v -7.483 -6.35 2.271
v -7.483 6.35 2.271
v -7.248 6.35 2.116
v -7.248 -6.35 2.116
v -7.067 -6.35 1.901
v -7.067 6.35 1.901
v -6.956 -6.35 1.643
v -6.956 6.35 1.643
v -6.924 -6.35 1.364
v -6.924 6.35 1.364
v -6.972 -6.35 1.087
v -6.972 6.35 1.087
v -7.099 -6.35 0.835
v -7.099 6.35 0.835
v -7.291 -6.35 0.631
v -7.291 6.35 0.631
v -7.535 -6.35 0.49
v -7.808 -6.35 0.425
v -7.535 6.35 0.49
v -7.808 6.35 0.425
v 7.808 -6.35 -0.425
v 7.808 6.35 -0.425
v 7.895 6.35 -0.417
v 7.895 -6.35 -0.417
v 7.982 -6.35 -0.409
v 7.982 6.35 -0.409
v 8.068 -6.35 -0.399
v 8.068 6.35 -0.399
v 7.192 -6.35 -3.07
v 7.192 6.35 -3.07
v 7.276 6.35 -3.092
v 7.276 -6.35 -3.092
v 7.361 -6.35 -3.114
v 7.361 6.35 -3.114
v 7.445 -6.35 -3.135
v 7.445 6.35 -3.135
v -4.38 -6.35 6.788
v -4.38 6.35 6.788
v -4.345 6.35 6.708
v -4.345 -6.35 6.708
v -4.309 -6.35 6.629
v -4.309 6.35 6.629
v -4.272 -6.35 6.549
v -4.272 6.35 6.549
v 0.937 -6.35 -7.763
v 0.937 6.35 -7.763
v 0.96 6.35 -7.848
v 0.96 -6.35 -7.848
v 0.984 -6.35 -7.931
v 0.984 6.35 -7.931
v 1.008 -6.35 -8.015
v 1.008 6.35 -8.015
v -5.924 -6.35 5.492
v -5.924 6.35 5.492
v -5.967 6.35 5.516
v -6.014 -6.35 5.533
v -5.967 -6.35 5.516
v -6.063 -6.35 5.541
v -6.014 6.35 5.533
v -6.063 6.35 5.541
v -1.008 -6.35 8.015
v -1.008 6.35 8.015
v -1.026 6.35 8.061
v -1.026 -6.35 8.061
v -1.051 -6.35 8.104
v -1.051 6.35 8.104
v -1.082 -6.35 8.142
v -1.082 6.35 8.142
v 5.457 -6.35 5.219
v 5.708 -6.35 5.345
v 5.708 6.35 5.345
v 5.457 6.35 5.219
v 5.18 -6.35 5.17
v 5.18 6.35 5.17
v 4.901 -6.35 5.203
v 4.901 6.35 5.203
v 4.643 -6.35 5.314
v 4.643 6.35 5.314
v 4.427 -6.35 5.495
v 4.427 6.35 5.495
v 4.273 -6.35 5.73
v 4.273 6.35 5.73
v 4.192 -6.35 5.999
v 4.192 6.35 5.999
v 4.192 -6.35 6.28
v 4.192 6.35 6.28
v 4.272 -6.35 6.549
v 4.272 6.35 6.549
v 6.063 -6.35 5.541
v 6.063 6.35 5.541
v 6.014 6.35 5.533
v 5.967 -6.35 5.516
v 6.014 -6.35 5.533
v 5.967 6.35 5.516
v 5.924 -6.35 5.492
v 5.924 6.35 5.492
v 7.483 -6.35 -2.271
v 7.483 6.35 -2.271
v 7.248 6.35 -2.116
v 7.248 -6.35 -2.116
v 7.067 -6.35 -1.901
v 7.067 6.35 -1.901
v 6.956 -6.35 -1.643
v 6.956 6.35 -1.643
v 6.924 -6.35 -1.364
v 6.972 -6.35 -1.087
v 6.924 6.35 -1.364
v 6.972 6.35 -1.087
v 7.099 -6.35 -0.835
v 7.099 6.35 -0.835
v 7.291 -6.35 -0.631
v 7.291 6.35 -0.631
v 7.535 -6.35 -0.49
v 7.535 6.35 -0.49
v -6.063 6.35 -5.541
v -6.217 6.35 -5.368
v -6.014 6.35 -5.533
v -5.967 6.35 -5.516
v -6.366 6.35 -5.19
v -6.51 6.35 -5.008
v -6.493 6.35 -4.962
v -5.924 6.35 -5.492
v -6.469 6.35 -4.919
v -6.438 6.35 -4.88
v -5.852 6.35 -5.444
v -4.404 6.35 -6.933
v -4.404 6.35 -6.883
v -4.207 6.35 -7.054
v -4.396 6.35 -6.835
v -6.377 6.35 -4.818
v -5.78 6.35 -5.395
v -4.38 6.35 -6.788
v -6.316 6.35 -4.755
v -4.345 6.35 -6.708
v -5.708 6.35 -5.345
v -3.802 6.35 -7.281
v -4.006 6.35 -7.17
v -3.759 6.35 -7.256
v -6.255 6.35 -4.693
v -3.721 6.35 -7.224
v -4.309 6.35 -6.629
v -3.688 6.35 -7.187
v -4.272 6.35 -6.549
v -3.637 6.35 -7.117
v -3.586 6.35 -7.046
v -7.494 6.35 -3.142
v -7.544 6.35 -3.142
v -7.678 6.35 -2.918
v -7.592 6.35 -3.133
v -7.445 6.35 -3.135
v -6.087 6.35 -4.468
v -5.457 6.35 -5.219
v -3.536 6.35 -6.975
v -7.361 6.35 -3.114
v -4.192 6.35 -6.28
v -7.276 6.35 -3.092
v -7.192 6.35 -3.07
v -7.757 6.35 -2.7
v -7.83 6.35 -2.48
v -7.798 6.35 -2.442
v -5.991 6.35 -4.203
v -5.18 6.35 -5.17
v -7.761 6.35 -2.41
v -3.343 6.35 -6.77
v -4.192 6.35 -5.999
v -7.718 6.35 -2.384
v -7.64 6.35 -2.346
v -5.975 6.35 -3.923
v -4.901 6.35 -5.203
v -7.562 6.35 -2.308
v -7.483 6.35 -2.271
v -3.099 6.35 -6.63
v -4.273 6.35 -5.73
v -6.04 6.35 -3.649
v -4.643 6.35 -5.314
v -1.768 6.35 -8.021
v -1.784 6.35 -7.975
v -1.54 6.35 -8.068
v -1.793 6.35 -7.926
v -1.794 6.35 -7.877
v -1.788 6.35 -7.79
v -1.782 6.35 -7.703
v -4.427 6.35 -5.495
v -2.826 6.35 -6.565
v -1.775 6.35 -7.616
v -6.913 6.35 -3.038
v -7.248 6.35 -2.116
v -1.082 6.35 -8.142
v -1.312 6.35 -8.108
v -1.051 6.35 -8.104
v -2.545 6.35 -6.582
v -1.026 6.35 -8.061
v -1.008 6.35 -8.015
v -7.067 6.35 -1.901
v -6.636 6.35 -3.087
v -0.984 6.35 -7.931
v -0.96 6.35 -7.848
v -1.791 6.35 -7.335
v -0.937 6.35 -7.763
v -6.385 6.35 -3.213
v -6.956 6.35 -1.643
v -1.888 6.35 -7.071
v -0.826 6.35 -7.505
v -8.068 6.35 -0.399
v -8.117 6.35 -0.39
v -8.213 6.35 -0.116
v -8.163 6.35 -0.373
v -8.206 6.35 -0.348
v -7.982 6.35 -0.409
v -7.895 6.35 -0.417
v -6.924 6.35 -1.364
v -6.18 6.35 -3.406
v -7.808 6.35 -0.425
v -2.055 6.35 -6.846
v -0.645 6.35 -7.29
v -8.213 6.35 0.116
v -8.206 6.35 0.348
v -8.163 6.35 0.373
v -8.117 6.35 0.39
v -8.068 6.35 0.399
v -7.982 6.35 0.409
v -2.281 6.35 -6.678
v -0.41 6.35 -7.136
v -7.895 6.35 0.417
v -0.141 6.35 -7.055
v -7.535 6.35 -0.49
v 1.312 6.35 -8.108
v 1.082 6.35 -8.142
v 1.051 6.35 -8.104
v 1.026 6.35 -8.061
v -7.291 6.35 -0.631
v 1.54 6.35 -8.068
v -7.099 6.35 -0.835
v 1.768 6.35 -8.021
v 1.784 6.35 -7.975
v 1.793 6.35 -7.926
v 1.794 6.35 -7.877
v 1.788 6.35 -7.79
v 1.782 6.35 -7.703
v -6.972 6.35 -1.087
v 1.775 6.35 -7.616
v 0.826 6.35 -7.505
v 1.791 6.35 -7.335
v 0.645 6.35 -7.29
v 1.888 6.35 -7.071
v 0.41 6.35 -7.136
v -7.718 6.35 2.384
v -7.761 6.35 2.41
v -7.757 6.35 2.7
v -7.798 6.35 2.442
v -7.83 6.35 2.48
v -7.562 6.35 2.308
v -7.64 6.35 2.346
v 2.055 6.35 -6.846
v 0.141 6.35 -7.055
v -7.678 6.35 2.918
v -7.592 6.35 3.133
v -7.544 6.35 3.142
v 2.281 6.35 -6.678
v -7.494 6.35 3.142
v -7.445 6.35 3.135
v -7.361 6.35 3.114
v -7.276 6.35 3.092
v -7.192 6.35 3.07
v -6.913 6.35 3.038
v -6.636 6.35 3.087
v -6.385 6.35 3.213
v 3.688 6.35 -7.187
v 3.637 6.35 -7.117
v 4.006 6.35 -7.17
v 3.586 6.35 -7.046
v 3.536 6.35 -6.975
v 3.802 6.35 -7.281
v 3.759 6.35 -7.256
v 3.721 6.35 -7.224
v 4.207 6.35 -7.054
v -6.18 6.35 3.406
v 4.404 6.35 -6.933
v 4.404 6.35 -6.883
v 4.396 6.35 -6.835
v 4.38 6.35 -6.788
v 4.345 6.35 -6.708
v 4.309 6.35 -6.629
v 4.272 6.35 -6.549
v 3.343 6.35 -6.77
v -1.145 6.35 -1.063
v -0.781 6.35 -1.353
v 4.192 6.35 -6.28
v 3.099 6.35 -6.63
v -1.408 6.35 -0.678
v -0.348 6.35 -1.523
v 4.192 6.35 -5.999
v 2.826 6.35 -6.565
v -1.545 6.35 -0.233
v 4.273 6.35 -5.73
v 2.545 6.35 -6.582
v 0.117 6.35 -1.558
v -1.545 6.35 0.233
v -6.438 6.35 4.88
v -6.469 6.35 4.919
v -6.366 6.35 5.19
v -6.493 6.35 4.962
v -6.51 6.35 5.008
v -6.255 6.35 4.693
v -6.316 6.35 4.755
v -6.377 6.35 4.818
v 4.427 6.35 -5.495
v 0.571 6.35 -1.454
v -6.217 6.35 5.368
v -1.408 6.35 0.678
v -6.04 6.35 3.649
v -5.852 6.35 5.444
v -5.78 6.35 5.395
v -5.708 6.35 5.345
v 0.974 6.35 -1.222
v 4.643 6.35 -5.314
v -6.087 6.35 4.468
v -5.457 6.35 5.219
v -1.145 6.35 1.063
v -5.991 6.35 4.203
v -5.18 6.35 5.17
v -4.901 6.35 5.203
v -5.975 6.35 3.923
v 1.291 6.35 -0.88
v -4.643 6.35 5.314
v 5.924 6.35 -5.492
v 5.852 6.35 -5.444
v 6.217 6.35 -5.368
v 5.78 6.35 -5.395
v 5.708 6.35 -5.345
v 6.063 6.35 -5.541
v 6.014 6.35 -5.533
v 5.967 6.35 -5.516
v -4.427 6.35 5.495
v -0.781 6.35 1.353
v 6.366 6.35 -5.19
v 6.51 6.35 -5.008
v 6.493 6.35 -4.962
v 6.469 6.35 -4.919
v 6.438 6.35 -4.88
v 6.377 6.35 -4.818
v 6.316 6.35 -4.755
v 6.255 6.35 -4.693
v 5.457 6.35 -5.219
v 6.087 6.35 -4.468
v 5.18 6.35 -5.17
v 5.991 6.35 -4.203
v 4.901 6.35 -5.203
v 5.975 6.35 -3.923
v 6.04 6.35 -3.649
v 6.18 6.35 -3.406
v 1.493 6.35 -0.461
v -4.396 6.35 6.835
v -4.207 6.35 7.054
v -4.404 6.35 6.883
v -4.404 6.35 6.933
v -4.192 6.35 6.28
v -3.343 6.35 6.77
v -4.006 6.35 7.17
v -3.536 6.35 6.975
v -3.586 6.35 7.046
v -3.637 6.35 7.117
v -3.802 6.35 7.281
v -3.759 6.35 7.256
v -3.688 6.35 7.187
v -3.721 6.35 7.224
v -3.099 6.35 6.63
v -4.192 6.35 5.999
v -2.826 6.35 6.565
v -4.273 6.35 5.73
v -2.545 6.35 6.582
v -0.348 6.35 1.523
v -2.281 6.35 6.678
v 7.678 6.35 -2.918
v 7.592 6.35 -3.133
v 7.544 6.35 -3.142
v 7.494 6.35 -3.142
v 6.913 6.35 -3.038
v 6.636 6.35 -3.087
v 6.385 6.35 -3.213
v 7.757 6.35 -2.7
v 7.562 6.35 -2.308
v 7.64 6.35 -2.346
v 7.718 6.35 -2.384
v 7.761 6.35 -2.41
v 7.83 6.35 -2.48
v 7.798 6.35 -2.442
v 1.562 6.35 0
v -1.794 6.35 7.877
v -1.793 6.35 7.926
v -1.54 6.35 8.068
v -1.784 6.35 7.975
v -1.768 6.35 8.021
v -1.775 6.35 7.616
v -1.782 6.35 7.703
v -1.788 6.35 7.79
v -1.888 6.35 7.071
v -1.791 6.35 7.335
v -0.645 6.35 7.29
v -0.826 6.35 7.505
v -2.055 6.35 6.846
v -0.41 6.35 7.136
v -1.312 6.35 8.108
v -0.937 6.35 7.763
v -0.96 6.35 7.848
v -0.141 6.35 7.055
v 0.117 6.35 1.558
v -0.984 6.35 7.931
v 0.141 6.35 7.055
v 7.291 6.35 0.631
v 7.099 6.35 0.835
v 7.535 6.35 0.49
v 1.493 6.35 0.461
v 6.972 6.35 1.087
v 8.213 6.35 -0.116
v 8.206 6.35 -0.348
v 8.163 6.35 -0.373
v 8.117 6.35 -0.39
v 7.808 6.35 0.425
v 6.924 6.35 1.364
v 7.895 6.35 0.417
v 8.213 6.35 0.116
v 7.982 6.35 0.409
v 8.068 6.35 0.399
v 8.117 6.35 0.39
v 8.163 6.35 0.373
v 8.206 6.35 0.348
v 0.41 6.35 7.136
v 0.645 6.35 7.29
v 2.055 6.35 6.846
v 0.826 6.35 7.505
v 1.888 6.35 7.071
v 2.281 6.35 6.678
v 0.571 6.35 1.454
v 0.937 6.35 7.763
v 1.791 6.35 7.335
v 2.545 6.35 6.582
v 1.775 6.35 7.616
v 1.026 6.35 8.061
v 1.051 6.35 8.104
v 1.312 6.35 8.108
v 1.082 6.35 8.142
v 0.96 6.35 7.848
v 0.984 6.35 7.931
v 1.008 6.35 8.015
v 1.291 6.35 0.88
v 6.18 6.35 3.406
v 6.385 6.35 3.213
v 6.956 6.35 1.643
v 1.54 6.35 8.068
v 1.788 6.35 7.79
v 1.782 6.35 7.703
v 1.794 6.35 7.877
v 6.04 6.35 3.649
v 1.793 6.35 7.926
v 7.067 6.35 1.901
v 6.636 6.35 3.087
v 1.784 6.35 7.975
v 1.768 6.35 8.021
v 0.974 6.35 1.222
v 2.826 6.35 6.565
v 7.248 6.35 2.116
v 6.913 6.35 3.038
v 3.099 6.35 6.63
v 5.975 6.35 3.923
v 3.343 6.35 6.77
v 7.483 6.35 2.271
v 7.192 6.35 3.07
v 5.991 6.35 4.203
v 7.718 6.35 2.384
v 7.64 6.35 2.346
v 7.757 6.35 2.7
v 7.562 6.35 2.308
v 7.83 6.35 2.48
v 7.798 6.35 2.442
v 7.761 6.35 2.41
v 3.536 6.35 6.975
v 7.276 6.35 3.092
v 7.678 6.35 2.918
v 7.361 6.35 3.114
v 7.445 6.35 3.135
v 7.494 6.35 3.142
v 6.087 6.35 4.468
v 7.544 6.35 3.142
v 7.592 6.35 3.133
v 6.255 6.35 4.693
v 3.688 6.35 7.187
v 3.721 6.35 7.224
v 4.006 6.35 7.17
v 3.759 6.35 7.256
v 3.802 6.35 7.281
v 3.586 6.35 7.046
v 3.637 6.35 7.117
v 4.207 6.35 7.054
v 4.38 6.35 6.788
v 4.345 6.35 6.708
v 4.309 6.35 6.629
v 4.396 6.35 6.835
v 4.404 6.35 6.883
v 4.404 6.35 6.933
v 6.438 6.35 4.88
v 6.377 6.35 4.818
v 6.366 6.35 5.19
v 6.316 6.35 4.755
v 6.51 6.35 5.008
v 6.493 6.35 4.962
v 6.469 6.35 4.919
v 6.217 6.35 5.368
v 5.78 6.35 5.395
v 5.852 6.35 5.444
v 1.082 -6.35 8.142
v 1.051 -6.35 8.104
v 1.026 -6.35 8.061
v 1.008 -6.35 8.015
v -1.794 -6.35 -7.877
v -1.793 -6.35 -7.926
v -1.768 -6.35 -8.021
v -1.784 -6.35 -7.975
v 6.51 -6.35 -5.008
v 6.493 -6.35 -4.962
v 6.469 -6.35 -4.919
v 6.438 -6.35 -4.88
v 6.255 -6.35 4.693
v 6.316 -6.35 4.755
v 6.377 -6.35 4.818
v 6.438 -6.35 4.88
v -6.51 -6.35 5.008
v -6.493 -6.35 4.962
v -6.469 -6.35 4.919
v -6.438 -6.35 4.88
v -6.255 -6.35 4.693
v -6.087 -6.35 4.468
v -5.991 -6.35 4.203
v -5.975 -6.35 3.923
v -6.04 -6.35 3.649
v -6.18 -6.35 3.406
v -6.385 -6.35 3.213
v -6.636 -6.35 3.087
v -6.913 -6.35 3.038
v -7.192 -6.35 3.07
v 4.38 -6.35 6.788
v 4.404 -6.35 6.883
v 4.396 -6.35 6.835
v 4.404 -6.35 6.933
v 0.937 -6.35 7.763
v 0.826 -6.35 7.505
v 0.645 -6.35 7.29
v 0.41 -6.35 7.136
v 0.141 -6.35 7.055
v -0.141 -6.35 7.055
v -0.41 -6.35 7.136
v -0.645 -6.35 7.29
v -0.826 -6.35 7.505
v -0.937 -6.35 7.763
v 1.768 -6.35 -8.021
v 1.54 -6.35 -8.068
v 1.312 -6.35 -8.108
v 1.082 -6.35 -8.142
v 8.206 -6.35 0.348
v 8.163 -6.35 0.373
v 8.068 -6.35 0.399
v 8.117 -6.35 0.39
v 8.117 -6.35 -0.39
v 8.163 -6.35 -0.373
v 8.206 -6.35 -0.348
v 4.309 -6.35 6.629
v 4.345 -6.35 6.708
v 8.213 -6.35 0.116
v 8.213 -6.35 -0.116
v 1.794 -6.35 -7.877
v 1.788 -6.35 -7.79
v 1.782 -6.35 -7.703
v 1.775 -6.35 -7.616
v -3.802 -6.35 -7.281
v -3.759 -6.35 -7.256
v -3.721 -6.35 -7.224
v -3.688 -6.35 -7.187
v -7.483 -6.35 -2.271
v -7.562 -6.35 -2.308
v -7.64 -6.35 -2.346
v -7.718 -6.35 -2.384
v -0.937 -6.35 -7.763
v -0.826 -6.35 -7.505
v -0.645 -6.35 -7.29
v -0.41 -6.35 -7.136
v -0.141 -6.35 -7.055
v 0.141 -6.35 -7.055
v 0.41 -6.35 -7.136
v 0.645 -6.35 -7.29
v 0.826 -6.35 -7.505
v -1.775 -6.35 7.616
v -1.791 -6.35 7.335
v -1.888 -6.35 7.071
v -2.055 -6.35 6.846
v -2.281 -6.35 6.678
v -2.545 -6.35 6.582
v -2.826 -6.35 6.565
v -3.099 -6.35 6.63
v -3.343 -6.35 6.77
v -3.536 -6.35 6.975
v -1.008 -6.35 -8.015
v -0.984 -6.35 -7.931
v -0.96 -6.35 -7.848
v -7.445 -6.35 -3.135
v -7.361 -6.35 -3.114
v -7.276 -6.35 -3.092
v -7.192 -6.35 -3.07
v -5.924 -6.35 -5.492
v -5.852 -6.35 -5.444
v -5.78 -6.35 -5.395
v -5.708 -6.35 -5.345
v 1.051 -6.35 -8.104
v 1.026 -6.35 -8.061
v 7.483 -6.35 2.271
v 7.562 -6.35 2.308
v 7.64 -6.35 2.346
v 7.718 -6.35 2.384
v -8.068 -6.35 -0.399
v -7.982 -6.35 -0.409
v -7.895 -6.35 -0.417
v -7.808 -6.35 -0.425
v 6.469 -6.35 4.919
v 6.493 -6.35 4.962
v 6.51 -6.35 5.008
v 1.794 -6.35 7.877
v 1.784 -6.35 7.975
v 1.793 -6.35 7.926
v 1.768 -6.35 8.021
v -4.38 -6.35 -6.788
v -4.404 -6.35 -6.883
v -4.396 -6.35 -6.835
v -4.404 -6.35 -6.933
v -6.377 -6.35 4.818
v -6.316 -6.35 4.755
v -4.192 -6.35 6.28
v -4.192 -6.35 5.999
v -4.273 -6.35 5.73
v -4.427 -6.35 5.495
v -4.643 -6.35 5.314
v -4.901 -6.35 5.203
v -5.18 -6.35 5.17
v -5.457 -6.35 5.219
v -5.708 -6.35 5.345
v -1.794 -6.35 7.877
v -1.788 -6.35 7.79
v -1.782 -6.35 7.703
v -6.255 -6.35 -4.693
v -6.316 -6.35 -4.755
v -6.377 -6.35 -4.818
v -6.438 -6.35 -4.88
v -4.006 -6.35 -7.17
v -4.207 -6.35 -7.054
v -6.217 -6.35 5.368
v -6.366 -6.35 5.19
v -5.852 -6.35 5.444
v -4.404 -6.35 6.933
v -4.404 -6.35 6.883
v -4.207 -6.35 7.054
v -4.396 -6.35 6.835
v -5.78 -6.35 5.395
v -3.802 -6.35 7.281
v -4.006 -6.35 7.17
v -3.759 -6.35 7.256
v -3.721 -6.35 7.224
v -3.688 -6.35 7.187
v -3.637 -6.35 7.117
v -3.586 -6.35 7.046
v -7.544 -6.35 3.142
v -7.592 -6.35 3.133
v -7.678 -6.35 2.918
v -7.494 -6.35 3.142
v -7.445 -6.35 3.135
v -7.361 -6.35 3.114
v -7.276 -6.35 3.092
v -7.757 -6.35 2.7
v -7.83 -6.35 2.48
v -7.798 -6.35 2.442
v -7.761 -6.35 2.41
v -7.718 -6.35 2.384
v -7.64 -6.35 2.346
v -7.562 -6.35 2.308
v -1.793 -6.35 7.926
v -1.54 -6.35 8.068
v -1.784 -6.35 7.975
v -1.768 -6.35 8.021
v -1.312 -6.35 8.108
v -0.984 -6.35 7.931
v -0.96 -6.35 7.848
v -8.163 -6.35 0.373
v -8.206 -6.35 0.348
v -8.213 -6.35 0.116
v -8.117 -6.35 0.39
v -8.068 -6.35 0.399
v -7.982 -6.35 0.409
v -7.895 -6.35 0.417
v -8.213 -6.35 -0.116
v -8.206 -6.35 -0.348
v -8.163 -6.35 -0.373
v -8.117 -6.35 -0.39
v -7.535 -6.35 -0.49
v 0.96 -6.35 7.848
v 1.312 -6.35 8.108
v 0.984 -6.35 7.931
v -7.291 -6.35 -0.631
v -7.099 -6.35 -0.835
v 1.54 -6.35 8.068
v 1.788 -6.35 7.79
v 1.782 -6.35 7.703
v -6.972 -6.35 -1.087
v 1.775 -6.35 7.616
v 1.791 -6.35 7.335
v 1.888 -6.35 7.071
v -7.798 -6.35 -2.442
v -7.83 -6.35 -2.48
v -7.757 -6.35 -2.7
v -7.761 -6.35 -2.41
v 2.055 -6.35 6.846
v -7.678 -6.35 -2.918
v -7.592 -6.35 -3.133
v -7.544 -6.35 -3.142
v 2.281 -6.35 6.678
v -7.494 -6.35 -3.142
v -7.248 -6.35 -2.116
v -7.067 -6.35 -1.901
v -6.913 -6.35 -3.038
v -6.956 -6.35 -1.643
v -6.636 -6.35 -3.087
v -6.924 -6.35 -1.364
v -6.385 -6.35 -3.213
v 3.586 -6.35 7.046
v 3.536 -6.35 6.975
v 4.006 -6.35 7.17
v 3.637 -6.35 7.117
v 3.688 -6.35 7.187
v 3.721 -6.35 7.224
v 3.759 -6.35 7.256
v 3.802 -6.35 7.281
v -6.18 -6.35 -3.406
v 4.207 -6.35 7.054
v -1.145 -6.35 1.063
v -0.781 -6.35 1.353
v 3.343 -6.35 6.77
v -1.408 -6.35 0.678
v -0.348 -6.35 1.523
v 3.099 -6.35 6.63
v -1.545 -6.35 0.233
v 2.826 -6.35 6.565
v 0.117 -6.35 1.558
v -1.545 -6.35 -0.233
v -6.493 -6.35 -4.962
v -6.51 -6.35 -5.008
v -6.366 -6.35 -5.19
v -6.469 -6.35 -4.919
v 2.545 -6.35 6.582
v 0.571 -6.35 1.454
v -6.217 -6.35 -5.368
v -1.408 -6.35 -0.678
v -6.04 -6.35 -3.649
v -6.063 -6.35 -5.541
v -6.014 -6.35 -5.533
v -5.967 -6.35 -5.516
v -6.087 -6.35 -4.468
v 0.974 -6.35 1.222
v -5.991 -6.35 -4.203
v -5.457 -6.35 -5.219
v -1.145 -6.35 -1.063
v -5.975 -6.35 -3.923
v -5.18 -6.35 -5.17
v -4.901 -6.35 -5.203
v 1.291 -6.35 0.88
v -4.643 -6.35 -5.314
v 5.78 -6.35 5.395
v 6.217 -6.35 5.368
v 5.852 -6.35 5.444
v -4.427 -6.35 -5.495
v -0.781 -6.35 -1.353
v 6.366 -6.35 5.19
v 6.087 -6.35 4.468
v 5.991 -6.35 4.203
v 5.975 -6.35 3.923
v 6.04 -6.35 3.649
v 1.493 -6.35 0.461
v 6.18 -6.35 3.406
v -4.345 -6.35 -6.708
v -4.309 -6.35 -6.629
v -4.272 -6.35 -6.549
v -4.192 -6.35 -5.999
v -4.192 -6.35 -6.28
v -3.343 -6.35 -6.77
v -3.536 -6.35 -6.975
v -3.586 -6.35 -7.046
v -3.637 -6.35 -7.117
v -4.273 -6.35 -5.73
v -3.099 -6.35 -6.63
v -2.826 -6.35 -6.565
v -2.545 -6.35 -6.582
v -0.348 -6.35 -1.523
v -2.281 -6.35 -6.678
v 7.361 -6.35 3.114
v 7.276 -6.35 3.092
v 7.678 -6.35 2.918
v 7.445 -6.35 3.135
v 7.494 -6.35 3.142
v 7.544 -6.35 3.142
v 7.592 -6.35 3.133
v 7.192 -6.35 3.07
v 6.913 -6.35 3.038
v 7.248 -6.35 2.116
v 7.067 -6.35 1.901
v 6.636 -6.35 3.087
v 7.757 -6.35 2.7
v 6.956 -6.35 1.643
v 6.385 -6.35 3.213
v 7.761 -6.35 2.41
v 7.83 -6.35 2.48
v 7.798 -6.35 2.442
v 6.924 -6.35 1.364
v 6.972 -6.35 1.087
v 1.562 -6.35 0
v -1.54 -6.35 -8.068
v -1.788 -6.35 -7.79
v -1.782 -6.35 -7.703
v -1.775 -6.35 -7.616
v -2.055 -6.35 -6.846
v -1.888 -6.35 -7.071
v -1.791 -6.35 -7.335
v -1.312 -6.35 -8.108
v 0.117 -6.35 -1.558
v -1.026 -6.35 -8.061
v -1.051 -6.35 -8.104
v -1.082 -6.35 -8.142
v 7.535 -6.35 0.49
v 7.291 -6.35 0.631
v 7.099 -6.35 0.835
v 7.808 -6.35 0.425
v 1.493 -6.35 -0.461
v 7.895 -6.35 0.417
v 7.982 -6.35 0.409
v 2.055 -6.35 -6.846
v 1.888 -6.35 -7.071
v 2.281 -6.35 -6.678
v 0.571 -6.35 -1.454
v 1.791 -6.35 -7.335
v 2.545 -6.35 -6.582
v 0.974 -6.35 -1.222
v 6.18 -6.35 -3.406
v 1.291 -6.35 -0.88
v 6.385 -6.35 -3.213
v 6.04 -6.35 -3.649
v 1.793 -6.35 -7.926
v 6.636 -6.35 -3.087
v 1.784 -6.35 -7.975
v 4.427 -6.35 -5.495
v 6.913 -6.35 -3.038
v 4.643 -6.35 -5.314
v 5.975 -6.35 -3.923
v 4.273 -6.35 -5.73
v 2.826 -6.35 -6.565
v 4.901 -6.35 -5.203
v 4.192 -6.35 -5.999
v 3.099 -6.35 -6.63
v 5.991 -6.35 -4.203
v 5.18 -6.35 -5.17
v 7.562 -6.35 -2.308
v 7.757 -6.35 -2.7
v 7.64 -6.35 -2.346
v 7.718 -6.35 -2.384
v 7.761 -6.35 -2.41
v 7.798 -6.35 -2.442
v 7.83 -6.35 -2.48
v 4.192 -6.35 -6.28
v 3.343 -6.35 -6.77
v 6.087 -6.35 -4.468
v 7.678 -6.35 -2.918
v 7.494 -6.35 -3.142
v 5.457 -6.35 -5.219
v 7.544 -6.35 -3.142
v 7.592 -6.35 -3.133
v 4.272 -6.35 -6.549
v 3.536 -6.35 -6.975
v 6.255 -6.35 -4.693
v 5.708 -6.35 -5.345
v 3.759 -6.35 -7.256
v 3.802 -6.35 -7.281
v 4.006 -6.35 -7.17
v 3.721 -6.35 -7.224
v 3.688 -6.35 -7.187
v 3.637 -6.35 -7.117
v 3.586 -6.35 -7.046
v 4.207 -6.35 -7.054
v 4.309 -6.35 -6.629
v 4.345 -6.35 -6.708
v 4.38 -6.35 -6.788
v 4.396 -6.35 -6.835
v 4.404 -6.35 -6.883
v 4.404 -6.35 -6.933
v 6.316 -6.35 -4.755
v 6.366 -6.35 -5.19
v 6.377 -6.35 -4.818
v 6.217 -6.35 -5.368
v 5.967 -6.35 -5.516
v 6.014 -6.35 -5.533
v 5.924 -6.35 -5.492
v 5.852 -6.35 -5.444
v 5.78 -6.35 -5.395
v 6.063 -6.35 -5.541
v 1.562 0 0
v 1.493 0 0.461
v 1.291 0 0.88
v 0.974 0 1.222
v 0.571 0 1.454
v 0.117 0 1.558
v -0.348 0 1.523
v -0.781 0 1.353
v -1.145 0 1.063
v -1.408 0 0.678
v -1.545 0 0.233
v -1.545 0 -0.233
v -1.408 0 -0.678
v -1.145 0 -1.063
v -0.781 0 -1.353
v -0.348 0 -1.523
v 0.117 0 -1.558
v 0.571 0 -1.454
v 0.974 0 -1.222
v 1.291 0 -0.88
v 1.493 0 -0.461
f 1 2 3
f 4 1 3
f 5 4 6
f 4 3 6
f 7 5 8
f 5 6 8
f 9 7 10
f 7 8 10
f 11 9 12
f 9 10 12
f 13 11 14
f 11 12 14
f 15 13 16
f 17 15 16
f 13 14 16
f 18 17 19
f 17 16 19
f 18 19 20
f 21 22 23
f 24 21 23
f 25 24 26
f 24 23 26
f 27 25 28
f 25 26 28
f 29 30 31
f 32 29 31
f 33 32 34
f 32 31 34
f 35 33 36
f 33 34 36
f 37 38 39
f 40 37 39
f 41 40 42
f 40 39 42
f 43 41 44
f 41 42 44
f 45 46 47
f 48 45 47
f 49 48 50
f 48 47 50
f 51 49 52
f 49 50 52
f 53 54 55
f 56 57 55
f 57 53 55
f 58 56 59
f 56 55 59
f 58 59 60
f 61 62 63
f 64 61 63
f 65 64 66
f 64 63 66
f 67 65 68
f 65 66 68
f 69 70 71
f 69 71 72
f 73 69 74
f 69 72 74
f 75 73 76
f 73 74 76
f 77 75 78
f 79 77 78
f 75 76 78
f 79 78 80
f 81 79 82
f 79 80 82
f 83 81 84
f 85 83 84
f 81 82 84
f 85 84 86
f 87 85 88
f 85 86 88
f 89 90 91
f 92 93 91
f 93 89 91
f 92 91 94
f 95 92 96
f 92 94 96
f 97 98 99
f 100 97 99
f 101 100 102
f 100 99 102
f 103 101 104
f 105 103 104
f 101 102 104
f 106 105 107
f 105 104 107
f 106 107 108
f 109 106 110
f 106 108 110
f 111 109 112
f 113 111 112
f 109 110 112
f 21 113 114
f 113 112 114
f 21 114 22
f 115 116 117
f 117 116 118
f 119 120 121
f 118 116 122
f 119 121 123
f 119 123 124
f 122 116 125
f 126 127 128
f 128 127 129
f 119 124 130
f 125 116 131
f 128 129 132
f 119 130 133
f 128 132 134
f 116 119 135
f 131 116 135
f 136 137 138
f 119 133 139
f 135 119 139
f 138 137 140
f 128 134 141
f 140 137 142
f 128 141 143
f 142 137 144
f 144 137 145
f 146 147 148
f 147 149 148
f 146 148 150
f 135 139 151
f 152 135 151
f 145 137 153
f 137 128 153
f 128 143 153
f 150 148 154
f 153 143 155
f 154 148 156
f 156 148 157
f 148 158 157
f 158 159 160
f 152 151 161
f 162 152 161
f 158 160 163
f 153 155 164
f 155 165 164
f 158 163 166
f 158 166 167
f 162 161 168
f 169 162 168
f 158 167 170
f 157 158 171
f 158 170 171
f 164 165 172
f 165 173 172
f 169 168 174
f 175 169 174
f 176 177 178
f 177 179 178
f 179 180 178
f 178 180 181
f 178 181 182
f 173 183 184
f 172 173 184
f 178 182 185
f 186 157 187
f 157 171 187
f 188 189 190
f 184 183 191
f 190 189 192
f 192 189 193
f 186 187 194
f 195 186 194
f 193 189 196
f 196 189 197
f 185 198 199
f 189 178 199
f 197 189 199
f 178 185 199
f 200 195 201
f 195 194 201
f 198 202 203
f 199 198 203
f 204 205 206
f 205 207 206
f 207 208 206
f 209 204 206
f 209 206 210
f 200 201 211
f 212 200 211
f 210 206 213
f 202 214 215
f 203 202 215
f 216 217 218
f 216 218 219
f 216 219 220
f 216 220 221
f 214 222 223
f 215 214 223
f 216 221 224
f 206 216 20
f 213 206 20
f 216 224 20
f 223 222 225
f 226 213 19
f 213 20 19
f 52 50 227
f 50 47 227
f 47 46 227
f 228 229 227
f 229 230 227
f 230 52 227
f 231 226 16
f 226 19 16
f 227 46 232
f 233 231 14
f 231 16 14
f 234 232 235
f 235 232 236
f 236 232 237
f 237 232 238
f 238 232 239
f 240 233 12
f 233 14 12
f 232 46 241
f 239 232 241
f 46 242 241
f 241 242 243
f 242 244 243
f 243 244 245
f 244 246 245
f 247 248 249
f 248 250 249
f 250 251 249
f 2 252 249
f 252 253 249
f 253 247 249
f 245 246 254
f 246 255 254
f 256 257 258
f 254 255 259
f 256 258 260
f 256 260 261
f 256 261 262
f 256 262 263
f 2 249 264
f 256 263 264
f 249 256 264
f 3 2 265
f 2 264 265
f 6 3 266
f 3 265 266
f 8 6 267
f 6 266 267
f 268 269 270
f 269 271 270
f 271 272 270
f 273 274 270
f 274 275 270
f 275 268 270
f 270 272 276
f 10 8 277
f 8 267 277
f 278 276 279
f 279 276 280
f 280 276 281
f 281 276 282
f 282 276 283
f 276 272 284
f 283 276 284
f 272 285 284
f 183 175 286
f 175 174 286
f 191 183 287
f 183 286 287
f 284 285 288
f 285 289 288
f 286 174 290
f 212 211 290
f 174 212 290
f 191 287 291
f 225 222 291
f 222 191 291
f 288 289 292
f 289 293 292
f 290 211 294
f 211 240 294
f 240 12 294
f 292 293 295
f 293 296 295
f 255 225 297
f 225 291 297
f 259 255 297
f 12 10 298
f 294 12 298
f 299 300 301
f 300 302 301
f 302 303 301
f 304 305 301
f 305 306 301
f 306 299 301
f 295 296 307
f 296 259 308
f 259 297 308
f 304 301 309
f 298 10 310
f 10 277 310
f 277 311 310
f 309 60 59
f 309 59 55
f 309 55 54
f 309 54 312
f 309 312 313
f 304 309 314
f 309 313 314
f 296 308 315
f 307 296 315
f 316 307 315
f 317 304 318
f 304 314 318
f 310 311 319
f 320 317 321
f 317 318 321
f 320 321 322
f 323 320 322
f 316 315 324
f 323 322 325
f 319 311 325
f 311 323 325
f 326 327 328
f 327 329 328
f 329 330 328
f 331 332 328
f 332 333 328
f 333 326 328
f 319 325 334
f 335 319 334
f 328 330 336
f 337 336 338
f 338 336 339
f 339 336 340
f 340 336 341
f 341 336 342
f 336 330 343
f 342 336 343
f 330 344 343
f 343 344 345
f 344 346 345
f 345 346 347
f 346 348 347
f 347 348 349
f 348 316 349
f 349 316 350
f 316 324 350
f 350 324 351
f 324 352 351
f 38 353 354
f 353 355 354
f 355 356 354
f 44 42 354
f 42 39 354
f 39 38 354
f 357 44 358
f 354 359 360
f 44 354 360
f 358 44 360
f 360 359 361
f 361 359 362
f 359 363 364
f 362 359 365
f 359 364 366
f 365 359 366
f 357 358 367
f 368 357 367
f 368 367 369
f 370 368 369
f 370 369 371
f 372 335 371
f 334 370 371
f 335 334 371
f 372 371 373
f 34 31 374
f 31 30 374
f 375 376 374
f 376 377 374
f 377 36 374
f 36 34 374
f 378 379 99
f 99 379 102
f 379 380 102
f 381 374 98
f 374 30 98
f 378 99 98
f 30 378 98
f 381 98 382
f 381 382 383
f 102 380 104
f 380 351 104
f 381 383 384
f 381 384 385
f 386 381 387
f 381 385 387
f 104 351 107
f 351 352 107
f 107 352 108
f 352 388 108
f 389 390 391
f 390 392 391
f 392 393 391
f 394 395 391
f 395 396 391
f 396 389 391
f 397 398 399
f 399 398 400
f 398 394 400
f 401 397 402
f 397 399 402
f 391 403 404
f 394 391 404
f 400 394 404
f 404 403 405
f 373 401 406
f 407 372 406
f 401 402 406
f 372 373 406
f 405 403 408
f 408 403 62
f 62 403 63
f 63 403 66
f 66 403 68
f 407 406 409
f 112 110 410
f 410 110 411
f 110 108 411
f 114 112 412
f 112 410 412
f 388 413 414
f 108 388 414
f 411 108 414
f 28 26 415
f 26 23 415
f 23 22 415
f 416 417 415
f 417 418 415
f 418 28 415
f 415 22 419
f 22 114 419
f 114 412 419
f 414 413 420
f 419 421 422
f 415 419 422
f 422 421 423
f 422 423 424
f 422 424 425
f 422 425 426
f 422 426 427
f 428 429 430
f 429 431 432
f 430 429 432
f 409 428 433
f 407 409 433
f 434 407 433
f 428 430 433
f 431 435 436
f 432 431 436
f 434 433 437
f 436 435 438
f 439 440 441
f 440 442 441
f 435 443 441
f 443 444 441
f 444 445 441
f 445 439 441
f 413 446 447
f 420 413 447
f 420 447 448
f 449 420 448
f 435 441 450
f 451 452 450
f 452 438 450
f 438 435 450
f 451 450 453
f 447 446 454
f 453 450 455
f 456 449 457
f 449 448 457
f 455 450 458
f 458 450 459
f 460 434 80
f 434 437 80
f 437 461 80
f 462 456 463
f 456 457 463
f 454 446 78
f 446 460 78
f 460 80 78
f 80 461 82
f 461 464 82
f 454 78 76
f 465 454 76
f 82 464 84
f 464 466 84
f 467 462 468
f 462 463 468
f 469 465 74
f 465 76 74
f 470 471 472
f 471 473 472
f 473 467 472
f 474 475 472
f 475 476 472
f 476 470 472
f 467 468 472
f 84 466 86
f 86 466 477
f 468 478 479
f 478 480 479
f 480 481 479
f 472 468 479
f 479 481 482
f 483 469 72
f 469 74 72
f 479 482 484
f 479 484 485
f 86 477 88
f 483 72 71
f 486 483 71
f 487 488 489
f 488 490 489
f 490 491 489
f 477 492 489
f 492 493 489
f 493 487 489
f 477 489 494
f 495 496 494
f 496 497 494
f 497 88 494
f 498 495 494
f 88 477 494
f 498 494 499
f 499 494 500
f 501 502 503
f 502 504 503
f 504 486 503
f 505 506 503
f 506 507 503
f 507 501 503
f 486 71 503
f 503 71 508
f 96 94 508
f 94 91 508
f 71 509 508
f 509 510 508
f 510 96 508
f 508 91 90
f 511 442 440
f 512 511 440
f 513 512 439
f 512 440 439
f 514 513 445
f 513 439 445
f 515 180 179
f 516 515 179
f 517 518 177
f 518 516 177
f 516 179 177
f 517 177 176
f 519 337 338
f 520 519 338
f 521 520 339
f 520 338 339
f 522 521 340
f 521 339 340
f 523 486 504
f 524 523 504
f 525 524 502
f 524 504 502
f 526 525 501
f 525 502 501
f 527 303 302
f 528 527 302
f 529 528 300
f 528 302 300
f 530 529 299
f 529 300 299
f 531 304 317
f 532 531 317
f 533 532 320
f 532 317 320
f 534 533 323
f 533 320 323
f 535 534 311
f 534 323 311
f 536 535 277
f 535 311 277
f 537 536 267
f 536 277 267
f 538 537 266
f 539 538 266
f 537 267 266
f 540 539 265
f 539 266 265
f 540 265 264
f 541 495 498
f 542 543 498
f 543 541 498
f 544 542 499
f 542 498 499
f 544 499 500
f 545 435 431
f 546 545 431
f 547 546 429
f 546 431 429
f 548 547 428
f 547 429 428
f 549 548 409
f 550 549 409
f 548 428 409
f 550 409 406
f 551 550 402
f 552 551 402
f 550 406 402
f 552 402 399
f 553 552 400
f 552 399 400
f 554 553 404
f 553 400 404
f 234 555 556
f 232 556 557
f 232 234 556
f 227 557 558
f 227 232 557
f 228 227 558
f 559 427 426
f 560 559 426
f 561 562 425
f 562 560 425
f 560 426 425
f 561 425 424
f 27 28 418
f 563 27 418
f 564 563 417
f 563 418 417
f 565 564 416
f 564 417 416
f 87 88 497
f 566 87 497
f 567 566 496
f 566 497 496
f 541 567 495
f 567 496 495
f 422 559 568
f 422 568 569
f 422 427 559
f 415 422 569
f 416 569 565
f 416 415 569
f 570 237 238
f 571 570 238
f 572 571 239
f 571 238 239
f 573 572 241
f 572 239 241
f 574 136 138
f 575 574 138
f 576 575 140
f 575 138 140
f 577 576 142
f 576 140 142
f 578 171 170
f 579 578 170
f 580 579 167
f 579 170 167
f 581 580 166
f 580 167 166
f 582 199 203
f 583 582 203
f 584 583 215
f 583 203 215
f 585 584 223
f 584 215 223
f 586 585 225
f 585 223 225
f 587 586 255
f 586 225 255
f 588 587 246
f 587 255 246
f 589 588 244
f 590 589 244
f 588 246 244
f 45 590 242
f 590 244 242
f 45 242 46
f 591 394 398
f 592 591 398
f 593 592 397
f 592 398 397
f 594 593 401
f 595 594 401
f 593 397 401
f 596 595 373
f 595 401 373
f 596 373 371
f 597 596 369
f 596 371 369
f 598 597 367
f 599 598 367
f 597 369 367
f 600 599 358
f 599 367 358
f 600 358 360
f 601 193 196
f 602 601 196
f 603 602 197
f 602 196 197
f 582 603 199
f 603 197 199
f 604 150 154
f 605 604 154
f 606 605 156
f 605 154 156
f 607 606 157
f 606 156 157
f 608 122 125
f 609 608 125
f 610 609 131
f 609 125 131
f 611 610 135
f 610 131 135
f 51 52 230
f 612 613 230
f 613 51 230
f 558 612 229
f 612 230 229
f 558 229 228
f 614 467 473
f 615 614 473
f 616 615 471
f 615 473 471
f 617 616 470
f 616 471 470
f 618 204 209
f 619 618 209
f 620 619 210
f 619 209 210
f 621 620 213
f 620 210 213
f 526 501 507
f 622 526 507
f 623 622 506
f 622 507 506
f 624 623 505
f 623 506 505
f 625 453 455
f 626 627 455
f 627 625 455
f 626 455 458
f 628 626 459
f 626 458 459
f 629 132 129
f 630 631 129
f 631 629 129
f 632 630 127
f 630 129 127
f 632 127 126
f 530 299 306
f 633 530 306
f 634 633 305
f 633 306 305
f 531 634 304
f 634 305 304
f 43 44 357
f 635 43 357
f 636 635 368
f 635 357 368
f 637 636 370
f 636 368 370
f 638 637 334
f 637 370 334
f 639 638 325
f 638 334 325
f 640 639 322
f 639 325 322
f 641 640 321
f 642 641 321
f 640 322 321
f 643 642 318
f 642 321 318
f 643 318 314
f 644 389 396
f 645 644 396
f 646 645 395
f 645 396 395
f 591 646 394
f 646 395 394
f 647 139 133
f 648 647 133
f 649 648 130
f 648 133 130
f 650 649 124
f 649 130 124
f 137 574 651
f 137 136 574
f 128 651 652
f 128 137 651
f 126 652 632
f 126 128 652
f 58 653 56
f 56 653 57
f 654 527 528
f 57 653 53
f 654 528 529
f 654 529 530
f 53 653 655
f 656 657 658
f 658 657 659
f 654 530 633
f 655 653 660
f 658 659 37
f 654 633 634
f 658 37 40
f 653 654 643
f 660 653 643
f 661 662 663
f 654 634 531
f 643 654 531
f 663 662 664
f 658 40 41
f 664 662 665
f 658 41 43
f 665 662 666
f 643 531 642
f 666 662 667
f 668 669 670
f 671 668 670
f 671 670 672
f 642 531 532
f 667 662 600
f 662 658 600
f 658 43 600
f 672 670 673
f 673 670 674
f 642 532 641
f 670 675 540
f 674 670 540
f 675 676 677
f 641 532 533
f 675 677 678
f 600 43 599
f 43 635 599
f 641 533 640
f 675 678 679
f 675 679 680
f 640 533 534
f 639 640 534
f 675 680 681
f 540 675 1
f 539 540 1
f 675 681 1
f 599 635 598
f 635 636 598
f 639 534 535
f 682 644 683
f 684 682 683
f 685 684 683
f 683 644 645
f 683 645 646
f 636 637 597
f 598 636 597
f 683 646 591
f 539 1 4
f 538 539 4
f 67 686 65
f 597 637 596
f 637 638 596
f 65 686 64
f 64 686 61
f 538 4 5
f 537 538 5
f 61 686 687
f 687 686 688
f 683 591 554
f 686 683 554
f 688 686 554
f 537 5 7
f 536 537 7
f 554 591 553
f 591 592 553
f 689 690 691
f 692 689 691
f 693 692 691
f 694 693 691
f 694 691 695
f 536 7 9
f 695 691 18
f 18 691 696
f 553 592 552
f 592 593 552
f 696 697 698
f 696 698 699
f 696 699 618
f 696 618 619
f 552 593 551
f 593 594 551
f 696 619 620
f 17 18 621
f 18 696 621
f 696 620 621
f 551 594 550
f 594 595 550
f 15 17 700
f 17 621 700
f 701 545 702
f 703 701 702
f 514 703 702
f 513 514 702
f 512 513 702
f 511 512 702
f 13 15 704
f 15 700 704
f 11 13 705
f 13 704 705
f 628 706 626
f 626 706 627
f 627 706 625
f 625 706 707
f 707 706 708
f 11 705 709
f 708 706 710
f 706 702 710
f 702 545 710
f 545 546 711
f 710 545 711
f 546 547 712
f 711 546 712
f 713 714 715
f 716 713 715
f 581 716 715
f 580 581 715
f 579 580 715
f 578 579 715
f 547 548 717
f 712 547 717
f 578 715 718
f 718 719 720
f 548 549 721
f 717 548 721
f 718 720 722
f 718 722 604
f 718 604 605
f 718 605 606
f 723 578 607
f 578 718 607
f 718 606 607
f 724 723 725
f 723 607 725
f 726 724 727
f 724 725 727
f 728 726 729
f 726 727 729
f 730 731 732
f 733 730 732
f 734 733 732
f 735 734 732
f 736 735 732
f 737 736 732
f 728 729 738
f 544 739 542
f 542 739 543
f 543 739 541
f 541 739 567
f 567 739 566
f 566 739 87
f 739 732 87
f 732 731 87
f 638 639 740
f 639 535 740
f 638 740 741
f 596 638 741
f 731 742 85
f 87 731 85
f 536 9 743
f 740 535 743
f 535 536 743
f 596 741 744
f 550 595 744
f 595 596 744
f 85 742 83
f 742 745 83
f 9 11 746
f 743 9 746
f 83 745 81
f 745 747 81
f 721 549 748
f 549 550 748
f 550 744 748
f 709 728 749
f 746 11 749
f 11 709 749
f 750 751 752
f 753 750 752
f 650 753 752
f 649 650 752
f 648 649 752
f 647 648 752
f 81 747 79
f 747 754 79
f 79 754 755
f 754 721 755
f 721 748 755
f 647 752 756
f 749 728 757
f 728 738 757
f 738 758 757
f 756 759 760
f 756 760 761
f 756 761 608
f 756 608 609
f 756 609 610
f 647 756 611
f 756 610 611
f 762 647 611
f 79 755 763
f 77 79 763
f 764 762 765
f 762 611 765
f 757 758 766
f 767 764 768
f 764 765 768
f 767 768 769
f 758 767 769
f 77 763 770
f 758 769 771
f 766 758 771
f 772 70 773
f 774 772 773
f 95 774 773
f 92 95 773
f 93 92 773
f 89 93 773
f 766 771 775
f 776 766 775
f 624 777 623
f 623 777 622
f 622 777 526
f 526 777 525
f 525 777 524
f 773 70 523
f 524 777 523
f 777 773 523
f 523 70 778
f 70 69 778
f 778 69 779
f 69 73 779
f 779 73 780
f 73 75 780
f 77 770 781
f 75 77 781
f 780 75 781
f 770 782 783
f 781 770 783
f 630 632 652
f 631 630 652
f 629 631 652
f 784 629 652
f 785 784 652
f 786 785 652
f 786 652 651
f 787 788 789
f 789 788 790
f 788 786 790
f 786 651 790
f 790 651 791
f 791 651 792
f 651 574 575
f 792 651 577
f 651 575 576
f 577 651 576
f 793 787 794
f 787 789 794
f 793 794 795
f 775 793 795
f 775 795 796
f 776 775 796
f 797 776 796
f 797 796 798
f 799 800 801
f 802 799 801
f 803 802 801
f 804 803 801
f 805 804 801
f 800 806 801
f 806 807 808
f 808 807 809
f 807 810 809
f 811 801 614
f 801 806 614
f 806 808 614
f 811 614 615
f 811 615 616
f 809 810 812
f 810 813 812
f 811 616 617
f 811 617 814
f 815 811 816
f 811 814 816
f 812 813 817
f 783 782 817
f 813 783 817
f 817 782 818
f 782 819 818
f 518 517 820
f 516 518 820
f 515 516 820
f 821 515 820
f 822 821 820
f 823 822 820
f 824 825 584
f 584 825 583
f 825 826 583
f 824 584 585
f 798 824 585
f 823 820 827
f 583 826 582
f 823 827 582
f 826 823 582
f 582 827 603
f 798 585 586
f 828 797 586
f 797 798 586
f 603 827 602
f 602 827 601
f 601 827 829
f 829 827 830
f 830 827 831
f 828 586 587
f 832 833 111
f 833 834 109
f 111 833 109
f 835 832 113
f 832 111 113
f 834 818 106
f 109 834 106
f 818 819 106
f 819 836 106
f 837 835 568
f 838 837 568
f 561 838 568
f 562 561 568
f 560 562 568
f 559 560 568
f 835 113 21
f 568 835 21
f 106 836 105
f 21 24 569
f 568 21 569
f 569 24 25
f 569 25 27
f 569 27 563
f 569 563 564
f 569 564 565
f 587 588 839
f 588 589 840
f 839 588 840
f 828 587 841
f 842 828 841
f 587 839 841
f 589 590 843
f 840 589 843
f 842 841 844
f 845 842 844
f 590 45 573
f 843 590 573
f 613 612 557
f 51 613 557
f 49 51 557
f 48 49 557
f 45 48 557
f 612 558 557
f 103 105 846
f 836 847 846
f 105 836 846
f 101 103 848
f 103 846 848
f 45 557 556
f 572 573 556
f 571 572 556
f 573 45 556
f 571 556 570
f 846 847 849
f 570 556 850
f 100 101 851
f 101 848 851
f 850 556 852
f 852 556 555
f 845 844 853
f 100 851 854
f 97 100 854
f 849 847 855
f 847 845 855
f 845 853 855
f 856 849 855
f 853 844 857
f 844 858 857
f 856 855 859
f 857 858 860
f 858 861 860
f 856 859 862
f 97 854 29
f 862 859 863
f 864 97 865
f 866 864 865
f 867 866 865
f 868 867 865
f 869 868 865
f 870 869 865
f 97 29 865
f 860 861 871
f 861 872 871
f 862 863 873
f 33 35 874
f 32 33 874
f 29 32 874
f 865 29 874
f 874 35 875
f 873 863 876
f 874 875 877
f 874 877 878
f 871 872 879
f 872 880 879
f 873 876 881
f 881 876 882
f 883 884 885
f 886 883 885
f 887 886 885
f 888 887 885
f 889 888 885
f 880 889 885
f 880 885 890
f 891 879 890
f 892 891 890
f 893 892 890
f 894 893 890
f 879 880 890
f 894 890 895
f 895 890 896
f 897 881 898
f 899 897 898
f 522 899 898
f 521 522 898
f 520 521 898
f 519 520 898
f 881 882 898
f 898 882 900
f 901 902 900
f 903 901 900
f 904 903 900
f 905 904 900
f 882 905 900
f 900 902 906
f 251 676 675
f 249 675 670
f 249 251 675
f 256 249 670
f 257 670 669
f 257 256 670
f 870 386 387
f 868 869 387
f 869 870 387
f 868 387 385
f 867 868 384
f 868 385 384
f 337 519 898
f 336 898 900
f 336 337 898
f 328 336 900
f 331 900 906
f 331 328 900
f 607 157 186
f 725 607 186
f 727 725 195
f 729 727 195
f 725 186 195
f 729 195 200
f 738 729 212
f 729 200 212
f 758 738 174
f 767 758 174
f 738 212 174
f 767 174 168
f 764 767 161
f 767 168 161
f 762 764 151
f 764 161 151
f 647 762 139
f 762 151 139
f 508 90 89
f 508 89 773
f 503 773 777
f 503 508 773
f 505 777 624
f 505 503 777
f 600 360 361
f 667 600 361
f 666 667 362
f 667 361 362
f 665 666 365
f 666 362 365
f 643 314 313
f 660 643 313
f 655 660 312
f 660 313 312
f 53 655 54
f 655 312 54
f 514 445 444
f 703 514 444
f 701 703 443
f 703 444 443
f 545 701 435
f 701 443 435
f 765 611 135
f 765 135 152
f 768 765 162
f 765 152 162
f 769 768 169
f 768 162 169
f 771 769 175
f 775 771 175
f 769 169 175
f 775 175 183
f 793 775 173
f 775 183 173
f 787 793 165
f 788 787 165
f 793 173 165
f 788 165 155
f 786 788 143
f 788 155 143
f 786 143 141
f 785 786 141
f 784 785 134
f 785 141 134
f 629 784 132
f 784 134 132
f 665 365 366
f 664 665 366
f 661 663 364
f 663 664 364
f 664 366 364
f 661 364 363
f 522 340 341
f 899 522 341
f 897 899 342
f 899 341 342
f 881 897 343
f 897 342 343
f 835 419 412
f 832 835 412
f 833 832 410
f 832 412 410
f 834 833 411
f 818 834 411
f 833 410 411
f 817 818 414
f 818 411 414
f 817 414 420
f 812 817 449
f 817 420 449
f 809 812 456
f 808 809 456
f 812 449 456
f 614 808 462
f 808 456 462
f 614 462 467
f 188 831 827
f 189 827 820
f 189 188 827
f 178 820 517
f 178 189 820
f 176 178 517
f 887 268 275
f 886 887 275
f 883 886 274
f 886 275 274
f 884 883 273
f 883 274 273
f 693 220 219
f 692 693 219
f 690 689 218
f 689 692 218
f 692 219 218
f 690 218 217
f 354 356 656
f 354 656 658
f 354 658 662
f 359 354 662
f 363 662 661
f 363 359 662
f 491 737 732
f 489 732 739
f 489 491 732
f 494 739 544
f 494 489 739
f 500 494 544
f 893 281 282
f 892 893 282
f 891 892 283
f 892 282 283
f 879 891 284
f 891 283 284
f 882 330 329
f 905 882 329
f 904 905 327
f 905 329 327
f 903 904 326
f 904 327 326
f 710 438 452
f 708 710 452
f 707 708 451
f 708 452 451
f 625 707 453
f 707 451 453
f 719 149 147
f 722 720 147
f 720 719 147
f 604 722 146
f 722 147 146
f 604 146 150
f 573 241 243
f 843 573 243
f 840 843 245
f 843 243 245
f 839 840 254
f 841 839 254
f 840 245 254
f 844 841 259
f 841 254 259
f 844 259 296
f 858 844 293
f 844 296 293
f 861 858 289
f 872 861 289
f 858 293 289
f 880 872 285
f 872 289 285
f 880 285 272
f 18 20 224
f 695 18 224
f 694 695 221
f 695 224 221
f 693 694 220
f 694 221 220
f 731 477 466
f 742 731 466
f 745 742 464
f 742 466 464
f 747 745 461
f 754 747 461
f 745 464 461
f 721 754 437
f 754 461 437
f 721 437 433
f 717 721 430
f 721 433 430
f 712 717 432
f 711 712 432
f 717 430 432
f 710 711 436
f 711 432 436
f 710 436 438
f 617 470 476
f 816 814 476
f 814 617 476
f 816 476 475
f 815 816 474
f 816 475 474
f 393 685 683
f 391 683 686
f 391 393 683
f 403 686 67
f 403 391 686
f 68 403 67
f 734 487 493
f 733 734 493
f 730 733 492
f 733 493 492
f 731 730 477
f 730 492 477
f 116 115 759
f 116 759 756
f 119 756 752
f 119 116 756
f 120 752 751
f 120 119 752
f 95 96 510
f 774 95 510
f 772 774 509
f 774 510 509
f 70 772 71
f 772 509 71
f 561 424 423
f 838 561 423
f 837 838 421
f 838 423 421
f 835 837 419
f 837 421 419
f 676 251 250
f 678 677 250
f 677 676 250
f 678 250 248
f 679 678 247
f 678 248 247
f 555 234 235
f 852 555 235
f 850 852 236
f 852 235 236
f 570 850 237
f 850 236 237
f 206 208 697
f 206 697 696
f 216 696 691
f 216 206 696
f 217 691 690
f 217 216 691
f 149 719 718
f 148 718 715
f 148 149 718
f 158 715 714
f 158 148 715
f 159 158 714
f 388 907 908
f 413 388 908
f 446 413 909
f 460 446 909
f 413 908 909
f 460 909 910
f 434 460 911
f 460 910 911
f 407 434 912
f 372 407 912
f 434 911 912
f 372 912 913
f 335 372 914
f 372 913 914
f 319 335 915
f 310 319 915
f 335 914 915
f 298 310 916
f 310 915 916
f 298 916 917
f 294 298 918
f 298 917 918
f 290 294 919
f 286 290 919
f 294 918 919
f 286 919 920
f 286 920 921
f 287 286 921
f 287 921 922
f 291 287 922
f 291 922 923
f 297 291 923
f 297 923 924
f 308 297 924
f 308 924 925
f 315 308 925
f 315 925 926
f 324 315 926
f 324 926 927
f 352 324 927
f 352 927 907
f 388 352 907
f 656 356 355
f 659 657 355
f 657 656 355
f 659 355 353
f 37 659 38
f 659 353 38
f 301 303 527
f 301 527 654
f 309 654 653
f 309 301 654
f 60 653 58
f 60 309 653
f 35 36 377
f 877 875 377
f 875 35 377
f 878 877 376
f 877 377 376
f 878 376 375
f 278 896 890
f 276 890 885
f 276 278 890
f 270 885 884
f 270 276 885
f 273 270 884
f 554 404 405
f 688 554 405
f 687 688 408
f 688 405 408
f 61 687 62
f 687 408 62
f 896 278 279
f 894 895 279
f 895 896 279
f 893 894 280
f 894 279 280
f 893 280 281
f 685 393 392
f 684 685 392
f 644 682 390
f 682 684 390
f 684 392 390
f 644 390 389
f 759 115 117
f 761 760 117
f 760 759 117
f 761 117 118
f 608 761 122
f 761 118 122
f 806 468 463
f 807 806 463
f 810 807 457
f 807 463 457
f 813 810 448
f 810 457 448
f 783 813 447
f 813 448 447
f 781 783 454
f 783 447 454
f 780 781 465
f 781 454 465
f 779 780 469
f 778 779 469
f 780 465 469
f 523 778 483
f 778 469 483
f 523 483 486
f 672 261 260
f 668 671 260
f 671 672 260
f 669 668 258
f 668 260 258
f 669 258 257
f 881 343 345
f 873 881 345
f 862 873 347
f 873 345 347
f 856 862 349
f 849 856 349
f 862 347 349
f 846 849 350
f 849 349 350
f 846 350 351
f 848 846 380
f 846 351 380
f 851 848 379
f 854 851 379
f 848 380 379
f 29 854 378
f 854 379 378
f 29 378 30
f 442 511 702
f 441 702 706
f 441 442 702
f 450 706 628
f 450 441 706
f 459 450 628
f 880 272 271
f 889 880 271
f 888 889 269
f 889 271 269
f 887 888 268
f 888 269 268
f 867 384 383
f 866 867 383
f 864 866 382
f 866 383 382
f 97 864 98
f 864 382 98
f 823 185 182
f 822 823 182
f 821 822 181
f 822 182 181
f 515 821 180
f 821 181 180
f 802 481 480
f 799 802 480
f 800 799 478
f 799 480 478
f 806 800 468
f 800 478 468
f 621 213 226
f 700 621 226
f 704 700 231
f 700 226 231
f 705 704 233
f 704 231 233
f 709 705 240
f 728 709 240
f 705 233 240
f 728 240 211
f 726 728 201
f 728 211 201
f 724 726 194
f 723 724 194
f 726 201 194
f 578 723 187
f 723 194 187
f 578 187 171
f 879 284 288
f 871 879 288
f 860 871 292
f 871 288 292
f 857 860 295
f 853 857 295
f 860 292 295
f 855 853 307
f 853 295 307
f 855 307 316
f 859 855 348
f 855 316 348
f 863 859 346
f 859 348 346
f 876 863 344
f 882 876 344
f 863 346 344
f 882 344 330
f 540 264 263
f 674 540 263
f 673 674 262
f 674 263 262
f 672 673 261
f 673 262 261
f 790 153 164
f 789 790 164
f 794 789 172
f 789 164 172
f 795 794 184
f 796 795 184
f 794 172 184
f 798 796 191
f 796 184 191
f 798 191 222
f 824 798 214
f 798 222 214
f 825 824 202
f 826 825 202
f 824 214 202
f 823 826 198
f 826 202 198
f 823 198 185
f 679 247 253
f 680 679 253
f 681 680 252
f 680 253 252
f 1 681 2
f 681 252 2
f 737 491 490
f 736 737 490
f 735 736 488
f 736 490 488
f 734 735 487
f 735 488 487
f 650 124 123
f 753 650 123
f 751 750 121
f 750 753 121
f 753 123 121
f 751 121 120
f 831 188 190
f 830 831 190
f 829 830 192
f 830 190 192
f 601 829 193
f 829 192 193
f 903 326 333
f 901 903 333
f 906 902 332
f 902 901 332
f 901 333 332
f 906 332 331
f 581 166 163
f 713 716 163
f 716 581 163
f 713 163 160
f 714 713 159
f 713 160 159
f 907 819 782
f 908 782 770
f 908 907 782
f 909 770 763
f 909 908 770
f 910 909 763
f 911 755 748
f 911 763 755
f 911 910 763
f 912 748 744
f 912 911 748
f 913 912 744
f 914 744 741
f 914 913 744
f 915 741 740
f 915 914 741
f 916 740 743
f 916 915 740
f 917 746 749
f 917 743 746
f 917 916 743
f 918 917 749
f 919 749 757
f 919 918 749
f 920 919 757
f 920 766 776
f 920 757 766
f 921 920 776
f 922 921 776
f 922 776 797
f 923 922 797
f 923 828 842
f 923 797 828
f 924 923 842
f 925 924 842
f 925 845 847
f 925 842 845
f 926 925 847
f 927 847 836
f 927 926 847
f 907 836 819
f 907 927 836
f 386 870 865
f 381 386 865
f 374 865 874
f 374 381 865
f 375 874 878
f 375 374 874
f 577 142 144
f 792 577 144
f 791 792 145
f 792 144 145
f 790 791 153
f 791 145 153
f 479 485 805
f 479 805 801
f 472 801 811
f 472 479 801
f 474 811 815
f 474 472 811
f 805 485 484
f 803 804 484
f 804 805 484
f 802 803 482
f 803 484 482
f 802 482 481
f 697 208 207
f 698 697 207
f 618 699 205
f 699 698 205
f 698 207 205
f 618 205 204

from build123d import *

# Parameters (mm, degrees)
SKETCH1_R               = 8.213367202
TOOTHOD_DEPTH           = 6.35
TOOTHPROFILE_DEPTH      = 7.35
TOOTHPATTERN_COUNT      = 18
SKETCH7_R               = 1.5625
BORE_DEPTH              = 8.62
BORE_DEPTH_BACK         = 8.62
SKETCH11_W              = 19.982734404
SKETCH11_H              = 1.27
CUT_EXTRUDE2_DEPTH      = 10.991367202
CUT_EXTRUDE2_DEPTH_BACK = 10.991367202


with BuildPart() as part:
    # Sketch1 → ToothOD (new body, symmetric)
    with BuildSketch(Plane(origin=(0, 0, 0), x_dir=(1, 0, 0), z_dir=(0, 1, 0))):
        Circle(SKETCH1_R)
    extrude(amount=TOOTHOD_DEPTH, both=True)

    # Sketch2 → ToothProfile (cut, symmetric)
    with BuildSketch(Plane(origin=(0, 0, 0), x_dir=(1, 0, 0), z_dir=(0, 1, 0))):
        with BuildLine():
            ThreePointArc((-0.937033068, 7.763429198), (-0.590385173, 7.245254588), (0, 7.044967202))
            ThreePointArc((0, 7.044967202), (0.590385173, 7.245254588), (0.937033068, 7.763429198))
            ThreePointArc((0.937033068, 7.763429198), (0.971699064, 7.88954066), (1.007805813, 8.015247202))
            ThreePointArc((1.007805813, 8.015247202), (1.037242296, 8.083128985), (1.082411127, 8.141731201))
            ThreePointArc((1.082411127, 8.141731201), (0, 8.213367202), (-1.082411127, 8.141731201))
            ThreePointArc((-1.082411127, 8.141731201), (-1.037242296, 8.083128985), (-1.007805813, 8.015247202))
            ThreePointArc((-1.007805813, 8.015247202), (-0.971699064, 7.88954066), (-0.937033068, 7.763429198))
        make_face()
    toothprofile = extrude(amount=TOOTHPROFILE_DEPTH, both=True, mode=Mode.SUBTRACT)

    # ToothPattern: ToothProfile ×18 about axis
    toothpattern_axis = Axis((0, 0, 0), (0, 1, 0))
    for i in range(1, TOOTHPATTERN_COUNT):
        add(toothprofile.rotate(toothpattern_axis, i * 360 / TOOTHPATTERN_COUNT), mode=Mode.SUBTRACT)

    # Sketch4 → Flange (revolve)
    with BuildSketch(Plane.XY):
        with BuildLine():
            Line((0, -6.35), (8.467367202, -6.35))
            ThreePointArc((8.467367202, -6.35), (8.697013823, -6.385951298), (8.92243953, -6.442637424))
            ThreePointArc((8.92243953, -6.442637424), (9.490168107, -6.724197125), (9.991367202, -7.112))
            Line((9.991367202, -7.112), (9.991367202, -7.62))
            Line((9.991367202, -7.62), (0, -7.62))
            Line((0, -7.62), (0, -6.35))
        make_face()
        with BuildLine():
            Line((9.991367202, 7.62), (9.991367202, 7.112))
            ThreePointArc((9.991367202, 7.112), (9.490168107, 6.724197125), (8.92243953, 6.442637424))
            ThreePointArc((8.92243953, 6.442637424), (8.697013823, 6.385951298), (8.467367202, 6.35))
            Line((8.467367202, 6.35), (0, 6.35))
            Line((0, 6.35), (0, 7.62))
            Line((0, 7.62), (9.991367202, 7.62))
        make_face()
    revolve(axis=Axis((0, 8.73125, 0), (0, -1, 0)))

    # Sketch7 → Bore (cut, two sides)
    with BuildSketch(Plane.XZ) as bore_sk:
        Circle(SKETCH7_R)
    extrude(amount=BORE_DEPTH, mode=Mode.SUBTRACT)
    extrude(bore_sk.sketch, amount=-BORE_DEPTH_BACK, mode=Mode.SUBTRACT)

    # Sketch11 → Cut-Extrude2 (cut, two sides)
    with BuildSketch(Plane.XY) as cut_extrude2_sk:
        with Locations((0, 6.985)):
            Rectangle(SKETCH11_W, SKETCH11_H)
        with Locations((0, -6.985)):
            Rectangle(SKETCH11_W, SKETCH11_H)
    extrude(amount=CUT_EXTRUDE2_DEPTH, mode=Mode.SUBTRACT)
    extrude(cut_extrude2_sk.sketch, amount=-CUT_EXTRUDE2_DEPTH_BACK, mode=Mode.SUBTRACT)


solid = part.part
